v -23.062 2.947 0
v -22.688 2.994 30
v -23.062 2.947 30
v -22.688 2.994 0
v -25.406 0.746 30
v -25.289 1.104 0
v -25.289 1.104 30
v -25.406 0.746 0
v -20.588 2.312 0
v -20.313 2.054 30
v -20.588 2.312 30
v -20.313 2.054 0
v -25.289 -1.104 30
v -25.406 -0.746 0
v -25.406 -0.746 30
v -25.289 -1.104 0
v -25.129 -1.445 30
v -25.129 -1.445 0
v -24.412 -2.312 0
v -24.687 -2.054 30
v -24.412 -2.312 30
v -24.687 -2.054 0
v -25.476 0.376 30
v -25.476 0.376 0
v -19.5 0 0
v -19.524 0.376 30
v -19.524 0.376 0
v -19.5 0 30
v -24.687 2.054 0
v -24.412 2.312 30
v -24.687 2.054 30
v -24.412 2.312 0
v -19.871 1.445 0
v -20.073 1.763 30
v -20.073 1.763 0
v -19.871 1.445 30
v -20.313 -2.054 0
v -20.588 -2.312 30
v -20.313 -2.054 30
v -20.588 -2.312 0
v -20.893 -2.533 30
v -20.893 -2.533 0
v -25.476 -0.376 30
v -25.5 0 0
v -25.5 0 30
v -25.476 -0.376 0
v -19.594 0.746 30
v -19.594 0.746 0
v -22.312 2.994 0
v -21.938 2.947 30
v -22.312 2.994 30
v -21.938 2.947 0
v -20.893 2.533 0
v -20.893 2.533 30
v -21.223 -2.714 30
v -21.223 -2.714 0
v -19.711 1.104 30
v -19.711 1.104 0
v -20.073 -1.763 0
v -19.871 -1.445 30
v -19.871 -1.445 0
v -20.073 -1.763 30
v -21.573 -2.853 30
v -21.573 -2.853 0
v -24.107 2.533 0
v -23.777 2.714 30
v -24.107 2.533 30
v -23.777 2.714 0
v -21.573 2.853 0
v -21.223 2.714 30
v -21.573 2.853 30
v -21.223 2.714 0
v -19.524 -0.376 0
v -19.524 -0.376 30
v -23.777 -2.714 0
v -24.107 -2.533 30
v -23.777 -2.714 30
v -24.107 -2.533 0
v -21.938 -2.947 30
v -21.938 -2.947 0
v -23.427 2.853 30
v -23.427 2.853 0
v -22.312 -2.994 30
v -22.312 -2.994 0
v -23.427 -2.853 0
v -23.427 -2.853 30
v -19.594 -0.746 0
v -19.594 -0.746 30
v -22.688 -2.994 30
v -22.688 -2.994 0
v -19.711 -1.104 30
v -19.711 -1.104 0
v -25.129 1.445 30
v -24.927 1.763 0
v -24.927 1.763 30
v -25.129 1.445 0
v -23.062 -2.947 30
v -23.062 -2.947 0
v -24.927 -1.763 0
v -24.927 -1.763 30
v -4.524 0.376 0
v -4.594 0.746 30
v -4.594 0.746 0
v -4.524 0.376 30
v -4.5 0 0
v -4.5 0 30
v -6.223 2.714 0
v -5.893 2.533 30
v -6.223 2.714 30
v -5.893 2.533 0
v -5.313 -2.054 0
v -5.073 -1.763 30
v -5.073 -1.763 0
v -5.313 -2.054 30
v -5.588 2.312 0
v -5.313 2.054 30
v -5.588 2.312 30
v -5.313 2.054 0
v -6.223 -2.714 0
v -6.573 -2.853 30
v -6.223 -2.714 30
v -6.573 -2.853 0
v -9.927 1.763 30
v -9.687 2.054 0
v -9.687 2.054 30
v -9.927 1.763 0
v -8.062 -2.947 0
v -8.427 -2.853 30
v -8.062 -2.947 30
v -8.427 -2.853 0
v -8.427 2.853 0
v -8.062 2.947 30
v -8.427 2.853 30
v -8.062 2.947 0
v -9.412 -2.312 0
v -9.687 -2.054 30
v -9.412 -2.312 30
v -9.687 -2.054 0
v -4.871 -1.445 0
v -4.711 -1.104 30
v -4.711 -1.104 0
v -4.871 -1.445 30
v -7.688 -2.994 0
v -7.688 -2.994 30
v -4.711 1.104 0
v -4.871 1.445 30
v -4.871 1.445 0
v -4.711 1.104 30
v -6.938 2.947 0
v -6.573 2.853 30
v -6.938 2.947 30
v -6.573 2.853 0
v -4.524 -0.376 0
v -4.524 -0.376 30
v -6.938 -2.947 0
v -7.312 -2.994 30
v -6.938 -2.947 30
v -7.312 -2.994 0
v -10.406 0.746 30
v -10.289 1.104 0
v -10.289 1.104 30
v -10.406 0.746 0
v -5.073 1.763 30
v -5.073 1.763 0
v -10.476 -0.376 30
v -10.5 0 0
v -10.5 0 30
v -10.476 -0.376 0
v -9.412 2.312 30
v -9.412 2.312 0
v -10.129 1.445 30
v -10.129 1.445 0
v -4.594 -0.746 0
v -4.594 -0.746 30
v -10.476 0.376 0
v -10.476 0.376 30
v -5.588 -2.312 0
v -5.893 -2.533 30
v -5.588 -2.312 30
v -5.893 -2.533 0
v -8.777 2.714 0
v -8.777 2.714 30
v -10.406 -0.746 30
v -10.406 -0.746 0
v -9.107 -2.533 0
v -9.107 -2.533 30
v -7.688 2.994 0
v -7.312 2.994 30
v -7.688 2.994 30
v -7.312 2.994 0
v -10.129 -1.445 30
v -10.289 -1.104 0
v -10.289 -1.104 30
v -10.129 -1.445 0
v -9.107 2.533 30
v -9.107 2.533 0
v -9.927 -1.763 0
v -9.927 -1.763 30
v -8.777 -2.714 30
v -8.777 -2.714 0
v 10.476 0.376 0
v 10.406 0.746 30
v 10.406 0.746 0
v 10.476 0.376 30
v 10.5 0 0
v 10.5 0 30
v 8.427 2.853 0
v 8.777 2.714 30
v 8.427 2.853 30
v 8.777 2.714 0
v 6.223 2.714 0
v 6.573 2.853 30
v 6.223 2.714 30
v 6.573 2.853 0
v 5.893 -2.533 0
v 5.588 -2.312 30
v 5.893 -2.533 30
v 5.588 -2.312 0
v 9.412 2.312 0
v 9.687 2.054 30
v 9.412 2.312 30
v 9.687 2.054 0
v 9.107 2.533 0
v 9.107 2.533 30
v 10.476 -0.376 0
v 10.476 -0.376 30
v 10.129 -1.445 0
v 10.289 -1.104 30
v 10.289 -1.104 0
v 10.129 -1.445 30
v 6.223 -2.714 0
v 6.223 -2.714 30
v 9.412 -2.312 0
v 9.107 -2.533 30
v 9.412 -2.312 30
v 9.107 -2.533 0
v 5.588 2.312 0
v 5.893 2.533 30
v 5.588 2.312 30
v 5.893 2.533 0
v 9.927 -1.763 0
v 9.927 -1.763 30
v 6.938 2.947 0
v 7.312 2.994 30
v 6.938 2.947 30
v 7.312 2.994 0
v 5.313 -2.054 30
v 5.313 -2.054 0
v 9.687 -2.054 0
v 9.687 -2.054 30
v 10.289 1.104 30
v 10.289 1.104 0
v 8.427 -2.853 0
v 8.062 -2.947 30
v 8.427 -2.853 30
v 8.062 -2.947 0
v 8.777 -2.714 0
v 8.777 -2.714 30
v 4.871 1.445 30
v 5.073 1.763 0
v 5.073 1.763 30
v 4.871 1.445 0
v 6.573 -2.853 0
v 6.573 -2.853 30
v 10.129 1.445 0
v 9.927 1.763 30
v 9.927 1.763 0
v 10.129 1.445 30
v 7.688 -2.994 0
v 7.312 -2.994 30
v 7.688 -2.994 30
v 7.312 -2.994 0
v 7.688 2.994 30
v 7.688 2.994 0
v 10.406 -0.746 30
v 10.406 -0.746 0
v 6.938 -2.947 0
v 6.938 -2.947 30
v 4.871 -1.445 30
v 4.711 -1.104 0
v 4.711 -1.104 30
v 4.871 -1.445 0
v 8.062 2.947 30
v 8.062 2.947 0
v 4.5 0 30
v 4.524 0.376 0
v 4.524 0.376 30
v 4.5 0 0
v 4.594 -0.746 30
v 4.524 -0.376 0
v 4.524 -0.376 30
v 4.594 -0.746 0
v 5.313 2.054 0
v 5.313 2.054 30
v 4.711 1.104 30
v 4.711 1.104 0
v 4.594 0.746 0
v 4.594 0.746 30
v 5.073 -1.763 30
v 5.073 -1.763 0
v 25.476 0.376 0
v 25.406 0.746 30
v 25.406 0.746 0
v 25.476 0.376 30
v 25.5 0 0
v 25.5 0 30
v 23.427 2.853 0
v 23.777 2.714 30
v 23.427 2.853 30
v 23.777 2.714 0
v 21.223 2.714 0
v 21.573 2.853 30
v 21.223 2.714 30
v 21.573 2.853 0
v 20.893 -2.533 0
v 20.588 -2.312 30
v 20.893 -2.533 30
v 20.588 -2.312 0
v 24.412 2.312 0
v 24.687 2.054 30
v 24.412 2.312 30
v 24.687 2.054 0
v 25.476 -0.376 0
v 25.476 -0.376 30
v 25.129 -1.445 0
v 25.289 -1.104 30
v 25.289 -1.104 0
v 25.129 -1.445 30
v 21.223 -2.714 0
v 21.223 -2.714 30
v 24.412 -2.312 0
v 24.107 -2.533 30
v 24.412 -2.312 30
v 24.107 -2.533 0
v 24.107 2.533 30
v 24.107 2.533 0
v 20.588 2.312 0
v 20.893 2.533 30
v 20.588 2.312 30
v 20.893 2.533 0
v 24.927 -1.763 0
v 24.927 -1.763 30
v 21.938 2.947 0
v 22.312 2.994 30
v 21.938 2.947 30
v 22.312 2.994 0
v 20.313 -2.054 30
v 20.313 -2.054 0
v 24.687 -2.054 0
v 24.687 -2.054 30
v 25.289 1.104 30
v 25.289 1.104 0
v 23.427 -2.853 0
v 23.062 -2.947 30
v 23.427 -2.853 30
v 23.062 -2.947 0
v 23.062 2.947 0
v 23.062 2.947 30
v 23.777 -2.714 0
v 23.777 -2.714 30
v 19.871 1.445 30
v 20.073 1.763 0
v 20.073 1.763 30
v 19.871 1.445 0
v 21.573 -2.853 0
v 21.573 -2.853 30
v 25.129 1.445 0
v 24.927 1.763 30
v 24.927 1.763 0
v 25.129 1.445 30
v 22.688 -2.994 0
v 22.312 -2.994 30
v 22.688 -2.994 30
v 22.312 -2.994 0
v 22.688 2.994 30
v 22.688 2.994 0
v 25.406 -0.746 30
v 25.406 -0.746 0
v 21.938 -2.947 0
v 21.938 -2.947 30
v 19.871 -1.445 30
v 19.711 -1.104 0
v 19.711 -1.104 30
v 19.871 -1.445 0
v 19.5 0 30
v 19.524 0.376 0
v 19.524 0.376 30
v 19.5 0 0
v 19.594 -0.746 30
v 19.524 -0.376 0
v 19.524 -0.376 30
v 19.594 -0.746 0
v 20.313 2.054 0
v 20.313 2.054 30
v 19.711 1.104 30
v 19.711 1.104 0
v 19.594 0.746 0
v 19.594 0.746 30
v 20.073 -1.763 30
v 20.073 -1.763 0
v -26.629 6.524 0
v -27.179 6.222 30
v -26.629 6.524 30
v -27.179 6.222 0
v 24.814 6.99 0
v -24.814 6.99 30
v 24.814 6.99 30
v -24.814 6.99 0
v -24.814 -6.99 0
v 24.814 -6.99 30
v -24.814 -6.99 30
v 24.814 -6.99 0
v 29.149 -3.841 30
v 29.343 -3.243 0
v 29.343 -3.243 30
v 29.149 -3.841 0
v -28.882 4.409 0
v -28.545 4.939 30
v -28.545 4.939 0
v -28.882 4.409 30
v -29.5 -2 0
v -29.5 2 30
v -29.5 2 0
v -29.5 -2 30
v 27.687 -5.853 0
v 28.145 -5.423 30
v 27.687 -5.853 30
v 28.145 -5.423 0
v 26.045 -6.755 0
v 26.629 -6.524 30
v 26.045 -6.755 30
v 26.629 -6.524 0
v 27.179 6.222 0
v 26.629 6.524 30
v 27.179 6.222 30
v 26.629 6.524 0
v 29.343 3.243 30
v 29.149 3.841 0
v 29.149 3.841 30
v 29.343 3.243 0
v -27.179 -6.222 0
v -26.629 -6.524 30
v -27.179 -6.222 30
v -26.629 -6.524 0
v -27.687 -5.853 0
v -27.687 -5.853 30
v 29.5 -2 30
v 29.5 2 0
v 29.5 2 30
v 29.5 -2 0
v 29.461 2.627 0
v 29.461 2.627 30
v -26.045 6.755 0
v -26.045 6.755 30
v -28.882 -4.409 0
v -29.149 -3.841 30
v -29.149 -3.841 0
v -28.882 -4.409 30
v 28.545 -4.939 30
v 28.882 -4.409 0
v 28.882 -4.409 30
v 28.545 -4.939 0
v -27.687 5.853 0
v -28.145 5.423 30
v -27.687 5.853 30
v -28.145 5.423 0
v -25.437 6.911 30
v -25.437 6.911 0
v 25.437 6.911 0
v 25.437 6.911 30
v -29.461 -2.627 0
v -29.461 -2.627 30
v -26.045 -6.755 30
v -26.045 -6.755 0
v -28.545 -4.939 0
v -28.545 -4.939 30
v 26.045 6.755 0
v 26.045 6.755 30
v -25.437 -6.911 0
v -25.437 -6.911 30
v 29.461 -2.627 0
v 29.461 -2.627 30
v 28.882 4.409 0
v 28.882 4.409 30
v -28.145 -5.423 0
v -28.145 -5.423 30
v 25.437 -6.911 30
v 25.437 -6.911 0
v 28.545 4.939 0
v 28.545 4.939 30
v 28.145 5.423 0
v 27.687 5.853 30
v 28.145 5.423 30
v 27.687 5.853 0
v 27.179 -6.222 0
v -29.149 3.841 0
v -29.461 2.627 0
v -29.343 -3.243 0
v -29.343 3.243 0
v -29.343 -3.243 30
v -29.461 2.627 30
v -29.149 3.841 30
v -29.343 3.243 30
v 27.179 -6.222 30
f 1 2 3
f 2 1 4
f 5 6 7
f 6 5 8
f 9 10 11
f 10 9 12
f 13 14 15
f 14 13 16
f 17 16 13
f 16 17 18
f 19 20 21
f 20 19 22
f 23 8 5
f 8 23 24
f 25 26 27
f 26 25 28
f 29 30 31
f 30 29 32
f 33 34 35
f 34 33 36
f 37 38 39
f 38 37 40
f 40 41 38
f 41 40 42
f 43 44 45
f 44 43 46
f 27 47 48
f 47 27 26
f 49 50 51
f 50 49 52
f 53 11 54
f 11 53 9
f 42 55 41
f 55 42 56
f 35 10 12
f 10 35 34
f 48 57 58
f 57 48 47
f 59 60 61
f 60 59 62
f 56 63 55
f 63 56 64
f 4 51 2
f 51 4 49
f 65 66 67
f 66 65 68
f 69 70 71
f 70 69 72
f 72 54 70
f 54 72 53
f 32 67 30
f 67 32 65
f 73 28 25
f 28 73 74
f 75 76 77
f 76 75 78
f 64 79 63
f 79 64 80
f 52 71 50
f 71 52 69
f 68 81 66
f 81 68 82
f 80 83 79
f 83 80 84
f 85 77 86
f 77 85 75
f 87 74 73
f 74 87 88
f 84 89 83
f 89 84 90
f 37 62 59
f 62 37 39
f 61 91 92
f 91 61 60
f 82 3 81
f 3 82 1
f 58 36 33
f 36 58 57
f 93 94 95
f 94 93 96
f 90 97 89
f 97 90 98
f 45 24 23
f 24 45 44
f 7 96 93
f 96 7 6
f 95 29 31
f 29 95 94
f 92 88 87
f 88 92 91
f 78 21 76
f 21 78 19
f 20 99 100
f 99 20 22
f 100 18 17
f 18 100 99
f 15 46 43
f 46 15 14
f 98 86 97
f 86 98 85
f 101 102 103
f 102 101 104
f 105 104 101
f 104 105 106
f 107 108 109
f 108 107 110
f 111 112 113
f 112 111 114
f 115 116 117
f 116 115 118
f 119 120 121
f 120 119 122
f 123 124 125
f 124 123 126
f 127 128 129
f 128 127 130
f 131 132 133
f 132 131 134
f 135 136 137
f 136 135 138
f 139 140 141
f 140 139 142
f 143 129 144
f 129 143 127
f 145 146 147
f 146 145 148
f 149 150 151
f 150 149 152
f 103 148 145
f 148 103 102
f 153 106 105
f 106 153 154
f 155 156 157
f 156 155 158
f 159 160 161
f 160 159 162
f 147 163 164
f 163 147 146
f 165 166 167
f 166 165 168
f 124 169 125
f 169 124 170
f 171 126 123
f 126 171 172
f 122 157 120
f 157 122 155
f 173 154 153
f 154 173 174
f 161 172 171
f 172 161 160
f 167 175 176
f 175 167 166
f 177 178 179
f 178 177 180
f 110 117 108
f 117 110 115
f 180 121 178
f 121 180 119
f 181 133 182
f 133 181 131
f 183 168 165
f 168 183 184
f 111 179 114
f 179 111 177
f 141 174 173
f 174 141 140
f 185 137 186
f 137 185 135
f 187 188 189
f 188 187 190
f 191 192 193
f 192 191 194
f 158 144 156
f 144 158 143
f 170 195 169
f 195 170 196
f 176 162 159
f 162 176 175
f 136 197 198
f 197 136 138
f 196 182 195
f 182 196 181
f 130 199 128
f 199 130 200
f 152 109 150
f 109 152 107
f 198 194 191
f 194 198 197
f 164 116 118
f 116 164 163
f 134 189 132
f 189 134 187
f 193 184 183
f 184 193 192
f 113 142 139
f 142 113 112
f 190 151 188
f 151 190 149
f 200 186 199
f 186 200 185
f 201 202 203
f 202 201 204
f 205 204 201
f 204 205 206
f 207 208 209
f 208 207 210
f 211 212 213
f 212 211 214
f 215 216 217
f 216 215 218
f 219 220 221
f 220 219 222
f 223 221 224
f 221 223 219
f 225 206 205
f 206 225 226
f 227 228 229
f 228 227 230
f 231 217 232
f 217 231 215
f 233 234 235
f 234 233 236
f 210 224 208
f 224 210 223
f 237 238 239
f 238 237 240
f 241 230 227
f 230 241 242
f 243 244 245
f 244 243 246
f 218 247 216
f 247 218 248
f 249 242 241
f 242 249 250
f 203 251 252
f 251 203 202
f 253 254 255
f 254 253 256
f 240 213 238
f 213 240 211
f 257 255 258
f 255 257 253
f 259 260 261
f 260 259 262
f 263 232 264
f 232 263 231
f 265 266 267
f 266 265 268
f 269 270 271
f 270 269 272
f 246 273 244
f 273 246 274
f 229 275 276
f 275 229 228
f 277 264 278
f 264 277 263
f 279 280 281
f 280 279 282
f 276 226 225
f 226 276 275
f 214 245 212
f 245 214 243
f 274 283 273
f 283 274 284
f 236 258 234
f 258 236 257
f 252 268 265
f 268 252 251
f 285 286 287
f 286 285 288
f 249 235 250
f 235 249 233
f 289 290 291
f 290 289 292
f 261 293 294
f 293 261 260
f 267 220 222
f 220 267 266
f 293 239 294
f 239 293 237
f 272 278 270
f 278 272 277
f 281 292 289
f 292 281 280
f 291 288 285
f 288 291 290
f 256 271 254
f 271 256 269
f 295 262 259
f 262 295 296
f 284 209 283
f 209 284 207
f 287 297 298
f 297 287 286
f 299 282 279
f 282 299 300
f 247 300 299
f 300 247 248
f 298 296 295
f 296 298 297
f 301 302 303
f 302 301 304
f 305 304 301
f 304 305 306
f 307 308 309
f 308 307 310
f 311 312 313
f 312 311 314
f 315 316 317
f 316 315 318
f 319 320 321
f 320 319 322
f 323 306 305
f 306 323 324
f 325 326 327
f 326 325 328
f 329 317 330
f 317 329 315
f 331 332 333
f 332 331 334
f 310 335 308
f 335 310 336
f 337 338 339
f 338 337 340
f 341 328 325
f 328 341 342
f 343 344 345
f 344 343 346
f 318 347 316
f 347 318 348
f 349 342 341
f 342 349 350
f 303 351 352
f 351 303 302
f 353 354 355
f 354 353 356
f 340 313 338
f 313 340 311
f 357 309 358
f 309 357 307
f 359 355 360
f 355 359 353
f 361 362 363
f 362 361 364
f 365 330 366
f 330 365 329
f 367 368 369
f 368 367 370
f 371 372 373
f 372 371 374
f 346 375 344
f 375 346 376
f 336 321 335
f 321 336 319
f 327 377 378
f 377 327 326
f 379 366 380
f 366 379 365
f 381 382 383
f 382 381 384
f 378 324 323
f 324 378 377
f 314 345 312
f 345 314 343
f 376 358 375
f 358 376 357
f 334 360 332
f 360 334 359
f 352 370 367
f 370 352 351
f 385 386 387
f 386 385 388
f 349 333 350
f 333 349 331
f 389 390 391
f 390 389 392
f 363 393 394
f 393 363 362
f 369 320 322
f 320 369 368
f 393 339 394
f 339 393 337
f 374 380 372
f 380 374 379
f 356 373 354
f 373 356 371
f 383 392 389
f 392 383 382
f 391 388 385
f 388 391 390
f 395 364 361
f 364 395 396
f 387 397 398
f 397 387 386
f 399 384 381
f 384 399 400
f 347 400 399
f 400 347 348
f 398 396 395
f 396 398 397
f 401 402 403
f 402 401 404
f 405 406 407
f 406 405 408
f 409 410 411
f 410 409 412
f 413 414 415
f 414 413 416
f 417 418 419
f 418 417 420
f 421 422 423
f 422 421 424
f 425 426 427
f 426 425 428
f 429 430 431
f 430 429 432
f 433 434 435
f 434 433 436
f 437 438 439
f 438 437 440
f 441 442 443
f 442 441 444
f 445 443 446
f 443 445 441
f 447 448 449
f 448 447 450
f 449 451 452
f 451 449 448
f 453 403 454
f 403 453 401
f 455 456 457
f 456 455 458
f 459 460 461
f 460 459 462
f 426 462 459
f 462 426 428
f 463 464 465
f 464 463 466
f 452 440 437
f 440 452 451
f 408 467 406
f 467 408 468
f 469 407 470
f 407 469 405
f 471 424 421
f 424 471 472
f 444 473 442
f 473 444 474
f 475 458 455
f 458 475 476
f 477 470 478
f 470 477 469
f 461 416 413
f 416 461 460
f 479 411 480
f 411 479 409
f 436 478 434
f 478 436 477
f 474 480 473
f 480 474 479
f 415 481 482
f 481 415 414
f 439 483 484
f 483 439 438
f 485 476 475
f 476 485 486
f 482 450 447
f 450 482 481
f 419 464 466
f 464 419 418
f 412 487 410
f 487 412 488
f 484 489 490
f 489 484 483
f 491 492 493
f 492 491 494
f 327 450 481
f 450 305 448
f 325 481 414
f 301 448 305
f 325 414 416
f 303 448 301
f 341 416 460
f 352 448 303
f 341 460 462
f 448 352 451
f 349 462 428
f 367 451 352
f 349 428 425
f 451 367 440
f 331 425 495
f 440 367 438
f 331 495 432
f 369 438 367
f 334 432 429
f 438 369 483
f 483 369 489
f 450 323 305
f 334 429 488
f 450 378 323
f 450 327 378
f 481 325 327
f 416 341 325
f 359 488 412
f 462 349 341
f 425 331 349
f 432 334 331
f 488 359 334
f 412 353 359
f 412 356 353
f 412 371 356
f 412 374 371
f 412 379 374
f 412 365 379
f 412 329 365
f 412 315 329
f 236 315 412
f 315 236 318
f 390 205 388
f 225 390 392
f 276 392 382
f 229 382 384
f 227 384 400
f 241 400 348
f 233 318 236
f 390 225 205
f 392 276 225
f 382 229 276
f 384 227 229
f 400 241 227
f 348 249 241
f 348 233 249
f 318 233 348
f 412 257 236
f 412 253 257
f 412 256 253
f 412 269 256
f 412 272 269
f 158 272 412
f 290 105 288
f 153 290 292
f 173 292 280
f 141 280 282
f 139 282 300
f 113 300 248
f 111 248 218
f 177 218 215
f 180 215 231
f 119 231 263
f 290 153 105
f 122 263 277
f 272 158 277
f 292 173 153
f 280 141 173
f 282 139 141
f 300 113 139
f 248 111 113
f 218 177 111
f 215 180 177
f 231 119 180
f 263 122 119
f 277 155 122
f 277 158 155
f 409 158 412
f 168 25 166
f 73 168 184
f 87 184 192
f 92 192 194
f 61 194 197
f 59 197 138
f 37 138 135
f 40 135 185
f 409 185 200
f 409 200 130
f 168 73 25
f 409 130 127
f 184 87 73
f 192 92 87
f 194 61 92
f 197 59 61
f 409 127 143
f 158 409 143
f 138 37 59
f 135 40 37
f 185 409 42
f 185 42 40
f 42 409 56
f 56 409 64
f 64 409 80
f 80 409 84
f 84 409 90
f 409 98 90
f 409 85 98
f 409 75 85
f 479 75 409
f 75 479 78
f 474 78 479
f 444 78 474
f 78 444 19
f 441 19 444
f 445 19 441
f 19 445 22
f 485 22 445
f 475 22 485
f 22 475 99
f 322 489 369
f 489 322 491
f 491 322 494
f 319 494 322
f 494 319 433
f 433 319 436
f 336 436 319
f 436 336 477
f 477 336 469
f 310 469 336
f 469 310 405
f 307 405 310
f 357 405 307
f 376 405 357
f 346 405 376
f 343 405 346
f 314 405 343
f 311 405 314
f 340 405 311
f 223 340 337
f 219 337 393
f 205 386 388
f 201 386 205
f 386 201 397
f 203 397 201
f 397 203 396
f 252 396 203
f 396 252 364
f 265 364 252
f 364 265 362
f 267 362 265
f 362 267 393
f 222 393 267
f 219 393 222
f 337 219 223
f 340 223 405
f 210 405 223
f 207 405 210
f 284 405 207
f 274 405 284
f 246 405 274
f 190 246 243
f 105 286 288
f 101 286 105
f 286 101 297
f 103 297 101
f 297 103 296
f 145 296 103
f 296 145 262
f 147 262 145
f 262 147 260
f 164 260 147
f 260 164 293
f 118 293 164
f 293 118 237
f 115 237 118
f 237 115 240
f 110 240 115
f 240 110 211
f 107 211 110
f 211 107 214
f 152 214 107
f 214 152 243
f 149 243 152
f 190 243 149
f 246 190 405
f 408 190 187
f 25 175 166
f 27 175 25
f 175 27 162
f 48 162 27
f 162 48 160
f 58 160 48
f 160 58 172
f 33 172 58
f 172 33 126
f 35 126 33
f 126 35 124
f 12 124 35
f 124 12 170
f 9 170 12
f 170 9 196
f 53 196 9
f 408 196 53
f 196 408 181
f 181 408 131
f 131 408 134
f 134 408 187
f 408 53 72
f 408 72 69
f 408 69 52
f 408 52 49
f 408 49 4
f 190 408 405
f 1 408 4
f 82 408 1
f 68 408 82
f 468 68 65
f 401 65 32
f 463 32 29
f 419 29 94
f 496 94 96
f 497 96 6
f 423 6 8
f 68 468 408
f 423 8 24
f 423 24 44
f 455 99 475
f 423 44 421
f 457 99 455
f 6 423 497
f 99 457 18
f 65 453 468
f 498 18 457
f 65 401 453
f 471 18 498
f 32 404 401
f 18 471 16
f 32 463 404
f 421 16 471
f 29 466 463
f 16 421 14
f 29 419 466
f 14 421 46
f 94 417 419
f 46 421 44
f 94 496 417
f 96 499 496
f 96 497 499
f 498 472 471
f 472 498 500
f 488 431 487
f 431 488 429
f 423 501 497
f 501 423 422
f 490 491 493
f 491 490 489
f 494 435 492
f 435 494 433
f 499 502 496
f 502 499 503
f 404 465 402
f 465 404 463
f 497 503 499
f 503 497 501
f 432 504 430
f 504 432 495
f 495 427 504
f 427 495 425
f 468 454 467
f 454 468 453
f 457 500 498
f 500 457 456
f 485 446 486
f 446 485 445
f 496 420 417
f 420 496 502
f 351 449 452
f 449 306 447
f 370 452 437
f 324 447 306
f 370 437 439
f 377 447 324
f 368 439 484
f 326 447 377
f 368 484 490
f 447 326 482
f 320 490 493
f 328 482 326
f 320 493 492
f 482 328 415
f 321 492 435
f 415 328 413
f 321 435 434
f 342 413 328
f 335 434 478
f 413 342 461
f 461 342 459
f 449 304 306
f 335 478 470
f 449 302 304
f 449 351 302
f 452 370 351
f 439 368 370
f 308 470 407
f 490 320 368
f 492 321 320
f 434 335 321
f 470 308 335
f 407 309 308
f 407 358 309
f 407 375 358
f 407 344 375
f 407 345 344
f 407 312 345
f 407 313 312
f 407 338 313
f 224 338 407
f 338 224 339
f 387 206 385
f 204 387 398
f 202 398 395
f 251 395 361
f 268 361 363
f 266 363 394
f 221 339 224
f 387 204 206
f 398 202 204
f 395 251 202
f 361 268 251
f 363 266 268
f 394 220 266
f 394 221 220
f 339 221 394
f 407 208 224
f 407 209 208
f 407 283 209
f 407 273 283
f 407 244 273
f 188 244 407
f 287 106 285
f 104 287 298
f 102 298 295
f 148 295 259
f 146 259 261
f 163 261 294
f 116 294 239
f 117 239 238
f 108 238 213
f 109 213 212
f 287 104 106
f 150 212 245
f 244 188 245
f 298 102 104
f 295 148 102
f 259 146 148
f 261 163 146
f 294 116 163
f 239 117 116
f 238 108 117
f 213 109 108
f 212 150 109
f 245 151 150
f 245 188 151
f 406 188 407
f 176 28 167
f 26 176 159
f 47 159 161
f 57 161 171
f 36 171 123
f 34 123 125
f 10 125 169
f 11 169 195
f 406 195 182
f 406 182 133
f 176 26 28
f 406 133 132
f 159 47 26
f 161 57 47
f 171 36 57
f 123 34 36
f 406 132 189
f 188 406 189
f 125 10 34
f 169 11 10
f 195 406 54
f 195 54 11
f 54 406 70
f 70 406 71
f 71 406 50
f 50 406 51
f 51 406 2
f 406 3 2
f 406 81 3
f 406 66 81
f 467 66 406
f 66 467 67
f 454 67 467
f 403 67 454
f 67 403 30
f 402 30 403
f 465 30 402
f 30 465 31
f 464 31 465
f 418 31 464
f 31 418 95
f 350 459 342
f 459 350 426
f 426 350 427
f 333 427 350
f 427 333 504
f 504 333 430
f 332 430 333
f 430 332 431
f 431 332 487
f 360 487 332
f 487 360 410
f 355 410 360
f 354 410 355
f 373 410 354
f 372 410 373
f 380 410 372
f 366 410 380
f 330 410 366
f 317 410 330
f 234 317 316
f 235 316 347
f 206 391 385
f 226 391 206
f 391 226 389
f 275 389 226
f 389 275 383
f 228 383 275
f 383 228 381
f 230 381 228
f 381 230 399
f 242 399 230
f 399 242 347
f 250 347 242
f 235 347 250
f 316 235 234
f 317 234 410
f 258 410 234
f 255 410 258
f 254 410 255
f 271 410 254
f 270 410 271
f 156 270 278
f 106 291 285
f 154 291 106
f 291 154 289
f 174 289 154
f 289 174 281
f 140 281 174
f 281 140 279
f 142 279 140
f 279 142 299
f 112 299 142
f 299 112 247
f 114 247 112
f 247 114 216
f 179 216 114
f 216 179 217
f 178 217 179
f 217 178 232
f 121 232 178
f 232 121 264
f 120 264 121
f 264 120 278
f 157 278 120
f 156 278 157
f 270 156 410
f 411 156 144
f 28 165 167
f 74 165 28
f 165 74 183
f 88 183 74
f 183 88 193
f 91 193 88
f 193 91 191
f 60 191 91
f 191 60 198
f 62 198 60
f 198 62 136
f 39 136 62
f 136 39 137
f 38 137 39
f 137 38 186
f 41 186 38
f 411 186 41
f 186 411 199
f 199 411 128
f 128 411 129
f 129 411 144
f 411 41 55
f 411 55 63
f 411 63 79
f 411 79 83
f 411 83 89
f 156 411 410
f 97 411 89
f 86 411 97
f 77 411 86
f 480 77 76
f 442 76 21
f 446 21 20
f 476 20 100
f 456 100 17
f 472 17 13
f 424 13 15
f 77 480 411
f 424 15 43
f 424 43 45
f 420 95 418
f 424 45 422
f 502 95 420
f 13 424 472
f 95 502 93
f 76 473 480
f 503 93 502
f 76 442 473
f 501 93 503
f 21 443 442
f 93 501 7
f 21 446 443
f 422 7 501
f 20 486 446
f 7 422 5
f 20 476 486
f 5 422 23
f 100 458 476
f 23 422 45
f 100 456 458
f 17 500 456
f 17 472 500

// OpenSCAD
$fn = 50;


difference() {
	union() {
		hull() {
			translate(v = [-24.5000000000, 2.0000000000, 0]) {
				cylinder(h = 30, r = 5);
			}
			translate(v = [24.5000000000, 2.0000000000, 0]) {
				cylinder(h = 30, r = 5);
			}
			translate(v = [-24.5000000000, -2.0000000000, 0]) {
				cylinder(h = 30, r = 5);
			}
			translate(v = [24.5000000000, -2.0000000000, 0]) {
				cylinder(h = 30, r = 5);
			}
		}
	}
	union() {
		translate(v = [-22.5000000000, 0.0000000000, 0]) {
			translate(v = [0, 0, -100]) {
				cylinder(h = 200, r = 3.0000000000);
			}
		}
		translate(v = [-7.5000000000, 0.0000000000, 0]) {
			translate(v = [0, 0, -100]) {
				cylinder(h = 200, r = 3.0000000000);
			}
		}
		translate(v = [7.5000000000, 0.0000000000, 0]) {
			translate(v = [0, 0, -100]) {
				cylinder(h = 200, r = 3.0000000000);
			}
		}
		translate(v = [22.5000000000, 0.0000000000, 0]) {
			translate(v = [0, 0, -100]) {
				cylinder(h = 200, r = 3.0000000000);
			}
		}
	}
}
